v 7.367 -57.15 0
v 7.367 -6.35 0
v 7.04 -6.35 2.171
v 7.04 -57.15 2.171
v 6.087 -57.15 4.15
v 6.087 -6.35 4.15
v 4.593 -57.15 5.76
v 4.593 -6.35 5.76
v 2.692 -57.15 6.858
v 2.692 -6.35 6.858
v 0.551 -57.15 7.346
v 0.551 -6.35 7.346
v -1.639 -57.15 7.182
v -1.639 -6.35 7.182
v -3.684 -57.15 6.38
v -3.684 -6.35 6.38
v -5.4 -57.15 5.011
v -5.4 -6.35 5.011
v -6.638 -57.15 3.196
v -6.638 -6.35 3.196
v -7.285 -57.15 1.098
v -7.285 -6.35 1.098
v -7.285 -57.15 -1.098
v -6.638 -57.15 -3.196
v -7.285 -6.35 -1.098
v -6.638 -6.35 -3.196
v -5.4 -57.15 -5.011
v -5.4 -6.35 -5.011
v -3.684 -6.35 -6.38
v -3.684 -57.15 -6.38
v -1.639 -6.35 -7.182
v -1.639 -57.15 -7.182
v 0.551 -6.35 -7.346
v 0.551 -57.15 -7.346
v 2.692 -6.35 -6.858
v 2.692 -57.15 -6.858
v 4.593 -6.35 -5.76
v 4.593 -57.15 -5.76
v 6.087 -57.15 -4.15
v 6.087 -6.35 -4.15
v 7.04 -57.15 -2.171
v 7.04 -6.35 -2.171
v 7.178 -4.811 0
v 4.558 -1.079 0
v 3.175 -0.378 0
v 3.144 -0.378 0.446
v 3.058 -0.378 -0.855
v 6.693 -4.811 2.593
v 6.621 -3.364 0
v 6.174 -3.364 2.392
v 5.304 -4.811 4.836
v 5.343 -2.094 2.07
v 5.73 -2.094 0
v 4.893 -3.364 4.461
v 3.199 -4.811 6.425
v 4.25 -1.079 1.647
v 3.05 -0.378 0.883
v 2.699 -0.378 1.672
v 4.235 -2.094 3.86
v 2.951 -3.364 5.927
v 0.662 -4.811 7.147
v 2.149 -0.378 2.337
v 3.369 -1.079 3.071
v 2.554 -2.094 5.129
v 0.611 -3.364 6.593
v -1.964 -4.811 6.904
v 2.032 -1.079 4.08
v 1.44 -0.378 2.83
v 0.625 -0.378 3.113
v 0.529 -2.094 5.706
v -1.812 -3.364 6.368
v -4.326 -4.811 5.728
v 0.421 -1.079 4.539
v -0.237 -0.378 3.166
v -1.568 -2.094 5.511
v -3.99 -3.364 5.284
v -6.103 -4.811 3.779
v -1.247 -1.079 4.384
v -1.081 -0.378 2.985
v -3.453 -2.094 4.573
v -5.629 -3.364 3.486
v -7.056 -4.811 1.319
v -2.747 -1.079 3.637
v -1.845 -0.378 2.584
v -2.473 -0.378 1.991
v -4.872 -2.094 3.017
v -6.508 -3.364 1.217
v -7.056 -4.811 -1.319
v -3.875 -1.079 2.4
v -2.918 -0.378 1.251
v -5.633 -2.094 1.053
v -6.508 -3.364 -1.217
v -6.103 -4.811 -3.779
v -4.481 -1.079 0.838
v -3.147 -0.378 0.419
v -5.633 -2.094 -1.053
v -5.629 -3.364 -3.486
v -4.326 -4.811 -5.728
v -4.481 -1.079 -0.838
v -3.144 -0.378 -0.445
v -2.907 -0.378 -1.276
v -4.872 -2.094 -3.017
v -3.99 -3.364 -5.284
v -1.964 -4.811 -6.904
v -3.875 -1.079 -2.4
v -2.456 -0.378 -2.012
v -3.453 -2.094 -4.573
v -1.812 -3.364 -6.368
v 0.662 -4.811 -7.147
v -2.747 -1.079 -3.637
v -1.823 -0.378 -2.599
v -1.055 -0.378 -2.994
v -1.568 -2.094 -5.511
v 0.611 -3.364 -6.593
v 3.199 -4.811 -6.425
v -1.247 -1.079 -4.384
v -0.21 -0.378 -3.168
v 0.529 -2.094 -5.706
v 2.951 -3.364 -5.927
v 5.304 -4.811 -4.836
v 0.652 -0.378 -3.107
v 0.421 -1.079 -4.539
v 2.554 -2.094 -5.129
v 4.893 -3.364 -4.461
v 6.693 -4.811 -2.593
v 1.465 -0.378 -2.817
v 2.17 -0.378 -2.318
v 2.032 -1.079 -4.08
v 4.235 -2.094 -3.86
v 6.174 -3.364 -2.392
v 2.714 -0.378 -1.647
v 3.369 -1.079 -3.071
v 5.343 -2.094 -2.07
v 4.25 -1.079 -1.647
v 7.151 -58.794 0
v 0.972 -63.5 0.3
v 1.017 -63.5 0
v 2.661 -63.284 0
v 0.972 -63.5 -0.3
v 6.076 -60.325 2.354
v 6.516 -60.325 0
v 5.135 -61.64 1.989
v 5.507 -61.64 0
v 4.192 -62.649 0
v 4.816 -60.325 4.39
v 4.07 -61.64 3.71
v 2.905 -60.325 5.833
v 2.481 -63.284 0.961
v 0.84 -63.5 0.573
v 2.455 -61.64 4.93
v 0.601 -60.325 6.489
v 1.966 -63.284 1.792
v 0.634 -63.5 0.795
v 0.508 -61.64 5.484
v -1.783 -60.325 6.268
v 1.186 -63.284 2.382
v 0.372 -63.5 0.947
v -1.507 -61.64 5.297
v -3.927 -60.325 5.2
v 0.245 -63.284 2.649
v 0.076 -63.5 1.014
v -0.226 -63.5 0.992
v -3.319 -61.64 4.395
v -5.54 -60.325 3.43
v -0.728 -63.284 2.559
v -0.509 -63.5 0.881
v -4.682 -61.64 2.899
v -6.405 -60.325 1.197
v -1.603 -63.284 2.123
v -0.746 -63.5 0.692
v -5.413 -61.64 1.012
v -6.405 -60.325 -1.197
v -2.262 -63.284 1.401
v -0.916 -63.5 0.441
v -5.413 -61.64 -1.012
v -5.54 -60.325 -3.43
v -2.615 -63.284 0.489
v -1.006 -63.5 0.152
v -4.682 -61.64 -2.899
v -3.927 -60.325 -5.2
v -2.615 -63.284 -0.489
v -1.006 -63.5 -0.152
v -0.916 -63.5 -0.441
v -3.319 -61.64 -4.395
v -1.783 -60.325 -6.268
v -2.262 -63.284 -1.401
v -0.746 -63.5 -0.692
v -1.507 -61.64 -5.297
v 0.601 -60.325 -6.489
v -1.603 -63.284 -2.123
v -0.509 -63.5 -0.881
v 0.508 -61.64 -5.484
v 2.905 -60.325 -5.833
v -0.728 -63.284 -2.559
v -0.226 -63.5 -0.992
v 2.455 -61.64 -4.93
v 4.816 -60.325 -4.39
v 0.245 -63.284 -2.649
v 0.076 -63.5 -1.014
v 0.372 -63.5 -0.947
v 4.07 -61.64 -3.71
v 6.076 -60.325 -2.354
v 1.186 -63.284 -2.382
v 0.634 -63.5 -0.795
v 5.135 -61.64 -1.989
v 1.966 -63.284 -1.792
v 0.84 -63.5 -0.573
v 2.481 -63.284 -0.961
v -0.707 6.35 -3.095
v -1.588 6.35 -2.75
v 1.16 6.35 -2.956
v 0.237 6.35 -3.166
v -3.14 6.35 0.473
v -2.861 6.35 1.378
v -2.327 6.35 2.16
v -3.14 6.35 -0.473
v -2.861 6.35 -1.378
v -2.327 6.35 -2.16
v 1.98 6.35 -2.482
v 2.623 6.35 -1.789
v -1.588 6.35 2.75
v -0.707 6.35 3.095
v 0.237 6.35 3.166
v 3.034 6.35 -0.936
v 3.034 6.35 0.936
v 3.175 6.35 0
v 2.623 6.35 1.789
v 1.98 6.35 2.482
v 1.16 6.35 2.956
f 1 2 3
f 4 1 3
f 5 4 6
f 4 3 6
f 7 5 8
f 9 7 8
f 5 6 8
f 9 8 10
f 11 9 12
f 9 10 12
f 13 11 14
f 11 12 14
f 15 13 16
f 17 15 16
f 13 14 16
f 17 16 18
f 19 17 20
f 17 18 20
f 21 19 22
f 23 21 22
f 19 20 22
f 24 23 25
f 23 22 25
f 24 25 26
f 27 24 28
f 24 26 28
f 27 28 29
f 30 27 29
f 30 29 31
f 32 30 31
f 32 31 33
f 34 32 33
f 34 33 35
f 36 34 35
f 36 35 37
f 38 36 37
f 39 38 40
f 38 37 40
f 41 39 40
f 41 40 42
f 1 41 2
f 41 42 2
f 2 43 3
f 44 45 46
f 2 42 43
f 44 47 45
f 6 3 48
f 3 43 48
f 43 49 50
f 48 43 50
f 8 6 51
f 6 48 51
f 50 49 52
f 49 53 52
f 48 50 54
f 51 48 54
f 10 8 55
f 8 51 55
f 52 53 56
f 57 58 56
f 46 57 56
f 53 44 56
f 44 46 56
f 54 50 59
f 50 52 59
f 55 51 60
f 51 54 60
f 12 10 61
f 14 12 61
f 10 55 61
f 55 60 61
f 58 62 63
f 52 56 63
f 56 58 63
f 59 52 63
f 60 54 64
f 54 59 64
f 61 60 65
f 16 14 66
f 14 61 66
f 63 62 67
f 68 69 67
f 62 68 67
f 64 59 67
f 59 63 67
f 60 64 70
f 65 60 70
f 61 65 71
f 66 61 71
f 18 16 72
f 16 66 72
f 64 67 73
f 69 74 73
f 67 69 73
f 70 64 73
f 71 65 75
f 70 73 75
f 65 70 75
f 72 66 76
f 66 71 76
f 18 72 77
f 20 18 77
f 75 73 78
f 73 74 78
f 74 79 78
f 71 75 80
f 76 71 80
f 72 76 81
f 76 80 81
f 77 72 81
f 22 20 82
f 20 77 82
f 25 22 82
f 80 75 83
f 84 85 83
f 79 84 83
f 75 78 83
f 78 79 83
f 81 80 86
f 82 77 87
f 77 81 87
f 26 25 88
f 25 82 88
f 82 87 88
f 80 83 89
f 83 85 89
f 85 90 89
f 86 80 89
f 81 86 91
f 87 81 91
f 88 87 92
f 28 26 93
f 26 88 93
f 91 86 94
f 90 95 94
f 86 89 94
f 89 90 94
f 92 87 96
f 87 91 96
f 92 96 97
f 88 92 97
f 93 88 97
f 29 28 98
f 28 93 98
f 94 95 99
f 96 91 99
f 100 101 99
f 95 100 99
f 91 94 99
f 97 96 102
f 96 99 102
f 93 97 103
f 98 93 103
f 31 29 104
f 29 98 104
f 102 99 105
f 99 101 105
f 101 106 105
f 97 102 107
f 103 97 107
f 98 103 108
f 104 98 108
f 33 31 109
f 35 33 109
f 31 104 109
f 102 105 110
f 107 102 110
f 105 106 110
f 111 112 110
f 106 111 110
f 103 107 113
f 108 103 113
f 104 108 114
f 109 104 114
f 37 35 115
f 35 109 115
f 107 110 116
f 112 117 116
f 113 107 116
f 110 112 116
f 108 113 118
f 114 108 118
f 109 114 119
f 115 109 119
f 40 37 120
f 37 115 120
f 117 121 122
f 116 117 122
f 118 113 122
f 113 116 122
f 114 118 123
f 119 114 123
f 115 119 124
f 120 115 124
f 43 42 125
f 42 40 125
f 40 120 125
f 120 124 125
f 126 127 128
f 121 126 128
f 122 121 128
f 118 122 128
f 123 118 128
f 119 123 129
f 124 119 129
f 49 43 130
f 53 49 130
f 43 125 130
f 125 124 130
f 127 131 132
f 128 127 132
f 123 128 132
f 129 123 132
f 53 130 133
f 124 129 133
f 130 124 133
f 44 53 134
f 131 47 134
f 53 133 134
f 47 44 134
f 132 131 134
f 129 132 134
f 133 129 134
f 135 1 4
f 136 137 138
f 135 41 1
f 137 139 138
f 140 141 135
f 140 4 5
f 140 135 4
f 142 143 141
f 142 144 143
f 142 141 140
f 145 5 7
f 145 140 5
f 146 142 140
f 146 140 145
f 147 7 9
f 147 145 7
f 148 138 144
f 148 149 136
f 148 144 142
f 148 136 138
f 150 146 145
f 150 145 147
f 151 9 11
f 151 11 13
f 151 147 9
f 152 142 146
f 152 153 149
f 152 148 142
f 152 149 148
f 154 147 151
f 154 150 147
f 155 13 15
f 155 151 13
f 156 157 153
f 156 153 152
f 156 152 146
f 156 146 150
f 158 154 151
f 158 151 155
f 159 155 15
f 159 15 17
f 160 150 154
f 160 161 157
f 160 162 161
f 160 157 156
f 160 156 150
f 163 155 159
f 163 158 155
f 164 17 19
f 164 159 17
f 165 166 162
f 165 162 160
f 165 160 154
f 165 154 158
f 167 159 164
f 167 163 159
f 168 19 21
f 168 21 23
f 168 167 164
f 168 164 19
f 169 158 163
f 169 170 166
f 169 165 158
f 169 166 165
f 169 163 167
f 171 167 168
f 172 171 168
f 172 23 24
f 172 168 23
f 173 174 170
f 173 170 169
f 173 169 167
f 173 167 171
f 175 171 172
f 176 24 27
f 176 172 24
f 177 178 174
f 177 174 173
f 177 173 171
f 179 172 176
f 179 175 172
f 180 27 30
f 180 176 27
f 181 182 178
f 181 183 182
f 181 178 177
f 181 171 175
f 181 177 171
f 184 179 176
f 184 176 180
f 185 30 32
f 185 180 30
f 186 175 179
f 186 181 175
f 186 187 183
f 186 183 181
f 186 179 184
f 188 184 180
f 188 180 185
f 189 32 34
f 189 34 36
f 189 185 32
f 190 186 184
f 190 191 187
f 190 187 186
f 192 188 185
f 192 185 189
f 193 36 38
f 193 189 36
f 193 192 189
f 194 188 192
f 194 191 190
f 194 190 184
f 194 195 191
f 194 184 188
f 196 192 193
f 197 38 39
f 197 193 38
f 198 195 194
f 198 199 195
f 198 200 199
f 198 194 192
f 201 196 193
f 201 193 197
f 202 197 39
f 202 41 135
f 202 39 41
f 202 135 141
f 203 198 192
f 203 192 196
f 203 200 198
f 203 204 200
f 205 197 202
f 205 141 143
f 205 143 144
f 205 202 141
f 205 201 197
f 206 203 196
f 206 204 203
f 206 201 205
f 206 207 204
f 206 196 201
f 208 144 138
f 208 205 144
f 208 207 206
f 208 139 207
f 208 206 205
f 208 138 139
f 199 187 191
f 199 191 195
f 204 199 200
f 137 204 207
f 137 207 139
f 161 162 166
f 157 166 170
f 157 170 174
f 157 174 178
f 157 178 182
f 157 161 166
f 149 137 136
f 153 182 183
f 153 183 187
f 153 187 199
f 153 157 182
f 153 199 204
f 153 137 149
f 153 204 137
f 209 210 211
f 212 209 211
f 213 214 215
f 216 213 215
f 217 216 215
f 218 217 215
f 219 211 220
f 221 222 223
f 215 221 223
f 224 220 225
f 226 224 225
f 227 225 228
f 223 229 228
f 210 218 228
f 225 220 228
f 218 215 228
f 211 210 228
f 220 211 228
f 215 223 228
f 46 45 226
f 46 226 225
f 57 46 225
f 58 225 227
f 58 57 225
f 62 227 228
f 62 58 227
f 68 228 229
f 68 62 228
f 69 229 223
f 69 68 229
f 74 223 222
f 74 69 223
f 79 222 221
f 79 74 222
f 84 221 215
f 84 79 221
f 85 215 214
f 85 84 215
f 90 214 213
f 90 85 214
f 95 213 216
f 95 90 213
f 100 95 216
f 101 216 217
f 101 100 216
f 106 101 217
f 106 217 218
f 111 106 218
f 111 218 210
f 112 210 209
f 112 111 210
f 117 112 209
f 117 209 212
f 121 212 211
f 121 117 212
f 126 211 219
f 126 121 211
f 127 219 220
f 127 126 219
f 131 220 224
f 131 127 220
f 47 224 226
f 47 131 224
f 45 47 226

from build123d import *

# Parameters (mm, degrees)
F0_R     = 7.367097
F1_DEPTH = 63.5
F2_R     = 6.35
F3_R     = 6.35
F4_R     = 3.175
F5_DEPTH = 6.35


with BuildPart() as f1:
    # F0 (on Front) → F1 (new body)
    with BuildSketch(Plane.XZ):
        Circle(F0_R)
    extrude(amount=F1_DEPTH)

    # F2
    f2_edges = [f1.edges().sort_by_distance(p)[0] for p in [
        (-7.367097, -63.5, 0),
    ]]
    fillet(f2_edges, radius=F2_R)

    # F3
    f3_edges = [f1.edges().sort_by_distance(p)[0] for p in [
        (-7.367097, 0, 0),
    ]]
    fillet(f3_edges, radius=F3_R)

    # F4 (on Front) → F5 (join, symmetric)
    with BuildSketch(Plane.XZ):
        Circle(F4_R)
    extrude(amount=F5_DEPTH, both=True)


solid = f1.part
